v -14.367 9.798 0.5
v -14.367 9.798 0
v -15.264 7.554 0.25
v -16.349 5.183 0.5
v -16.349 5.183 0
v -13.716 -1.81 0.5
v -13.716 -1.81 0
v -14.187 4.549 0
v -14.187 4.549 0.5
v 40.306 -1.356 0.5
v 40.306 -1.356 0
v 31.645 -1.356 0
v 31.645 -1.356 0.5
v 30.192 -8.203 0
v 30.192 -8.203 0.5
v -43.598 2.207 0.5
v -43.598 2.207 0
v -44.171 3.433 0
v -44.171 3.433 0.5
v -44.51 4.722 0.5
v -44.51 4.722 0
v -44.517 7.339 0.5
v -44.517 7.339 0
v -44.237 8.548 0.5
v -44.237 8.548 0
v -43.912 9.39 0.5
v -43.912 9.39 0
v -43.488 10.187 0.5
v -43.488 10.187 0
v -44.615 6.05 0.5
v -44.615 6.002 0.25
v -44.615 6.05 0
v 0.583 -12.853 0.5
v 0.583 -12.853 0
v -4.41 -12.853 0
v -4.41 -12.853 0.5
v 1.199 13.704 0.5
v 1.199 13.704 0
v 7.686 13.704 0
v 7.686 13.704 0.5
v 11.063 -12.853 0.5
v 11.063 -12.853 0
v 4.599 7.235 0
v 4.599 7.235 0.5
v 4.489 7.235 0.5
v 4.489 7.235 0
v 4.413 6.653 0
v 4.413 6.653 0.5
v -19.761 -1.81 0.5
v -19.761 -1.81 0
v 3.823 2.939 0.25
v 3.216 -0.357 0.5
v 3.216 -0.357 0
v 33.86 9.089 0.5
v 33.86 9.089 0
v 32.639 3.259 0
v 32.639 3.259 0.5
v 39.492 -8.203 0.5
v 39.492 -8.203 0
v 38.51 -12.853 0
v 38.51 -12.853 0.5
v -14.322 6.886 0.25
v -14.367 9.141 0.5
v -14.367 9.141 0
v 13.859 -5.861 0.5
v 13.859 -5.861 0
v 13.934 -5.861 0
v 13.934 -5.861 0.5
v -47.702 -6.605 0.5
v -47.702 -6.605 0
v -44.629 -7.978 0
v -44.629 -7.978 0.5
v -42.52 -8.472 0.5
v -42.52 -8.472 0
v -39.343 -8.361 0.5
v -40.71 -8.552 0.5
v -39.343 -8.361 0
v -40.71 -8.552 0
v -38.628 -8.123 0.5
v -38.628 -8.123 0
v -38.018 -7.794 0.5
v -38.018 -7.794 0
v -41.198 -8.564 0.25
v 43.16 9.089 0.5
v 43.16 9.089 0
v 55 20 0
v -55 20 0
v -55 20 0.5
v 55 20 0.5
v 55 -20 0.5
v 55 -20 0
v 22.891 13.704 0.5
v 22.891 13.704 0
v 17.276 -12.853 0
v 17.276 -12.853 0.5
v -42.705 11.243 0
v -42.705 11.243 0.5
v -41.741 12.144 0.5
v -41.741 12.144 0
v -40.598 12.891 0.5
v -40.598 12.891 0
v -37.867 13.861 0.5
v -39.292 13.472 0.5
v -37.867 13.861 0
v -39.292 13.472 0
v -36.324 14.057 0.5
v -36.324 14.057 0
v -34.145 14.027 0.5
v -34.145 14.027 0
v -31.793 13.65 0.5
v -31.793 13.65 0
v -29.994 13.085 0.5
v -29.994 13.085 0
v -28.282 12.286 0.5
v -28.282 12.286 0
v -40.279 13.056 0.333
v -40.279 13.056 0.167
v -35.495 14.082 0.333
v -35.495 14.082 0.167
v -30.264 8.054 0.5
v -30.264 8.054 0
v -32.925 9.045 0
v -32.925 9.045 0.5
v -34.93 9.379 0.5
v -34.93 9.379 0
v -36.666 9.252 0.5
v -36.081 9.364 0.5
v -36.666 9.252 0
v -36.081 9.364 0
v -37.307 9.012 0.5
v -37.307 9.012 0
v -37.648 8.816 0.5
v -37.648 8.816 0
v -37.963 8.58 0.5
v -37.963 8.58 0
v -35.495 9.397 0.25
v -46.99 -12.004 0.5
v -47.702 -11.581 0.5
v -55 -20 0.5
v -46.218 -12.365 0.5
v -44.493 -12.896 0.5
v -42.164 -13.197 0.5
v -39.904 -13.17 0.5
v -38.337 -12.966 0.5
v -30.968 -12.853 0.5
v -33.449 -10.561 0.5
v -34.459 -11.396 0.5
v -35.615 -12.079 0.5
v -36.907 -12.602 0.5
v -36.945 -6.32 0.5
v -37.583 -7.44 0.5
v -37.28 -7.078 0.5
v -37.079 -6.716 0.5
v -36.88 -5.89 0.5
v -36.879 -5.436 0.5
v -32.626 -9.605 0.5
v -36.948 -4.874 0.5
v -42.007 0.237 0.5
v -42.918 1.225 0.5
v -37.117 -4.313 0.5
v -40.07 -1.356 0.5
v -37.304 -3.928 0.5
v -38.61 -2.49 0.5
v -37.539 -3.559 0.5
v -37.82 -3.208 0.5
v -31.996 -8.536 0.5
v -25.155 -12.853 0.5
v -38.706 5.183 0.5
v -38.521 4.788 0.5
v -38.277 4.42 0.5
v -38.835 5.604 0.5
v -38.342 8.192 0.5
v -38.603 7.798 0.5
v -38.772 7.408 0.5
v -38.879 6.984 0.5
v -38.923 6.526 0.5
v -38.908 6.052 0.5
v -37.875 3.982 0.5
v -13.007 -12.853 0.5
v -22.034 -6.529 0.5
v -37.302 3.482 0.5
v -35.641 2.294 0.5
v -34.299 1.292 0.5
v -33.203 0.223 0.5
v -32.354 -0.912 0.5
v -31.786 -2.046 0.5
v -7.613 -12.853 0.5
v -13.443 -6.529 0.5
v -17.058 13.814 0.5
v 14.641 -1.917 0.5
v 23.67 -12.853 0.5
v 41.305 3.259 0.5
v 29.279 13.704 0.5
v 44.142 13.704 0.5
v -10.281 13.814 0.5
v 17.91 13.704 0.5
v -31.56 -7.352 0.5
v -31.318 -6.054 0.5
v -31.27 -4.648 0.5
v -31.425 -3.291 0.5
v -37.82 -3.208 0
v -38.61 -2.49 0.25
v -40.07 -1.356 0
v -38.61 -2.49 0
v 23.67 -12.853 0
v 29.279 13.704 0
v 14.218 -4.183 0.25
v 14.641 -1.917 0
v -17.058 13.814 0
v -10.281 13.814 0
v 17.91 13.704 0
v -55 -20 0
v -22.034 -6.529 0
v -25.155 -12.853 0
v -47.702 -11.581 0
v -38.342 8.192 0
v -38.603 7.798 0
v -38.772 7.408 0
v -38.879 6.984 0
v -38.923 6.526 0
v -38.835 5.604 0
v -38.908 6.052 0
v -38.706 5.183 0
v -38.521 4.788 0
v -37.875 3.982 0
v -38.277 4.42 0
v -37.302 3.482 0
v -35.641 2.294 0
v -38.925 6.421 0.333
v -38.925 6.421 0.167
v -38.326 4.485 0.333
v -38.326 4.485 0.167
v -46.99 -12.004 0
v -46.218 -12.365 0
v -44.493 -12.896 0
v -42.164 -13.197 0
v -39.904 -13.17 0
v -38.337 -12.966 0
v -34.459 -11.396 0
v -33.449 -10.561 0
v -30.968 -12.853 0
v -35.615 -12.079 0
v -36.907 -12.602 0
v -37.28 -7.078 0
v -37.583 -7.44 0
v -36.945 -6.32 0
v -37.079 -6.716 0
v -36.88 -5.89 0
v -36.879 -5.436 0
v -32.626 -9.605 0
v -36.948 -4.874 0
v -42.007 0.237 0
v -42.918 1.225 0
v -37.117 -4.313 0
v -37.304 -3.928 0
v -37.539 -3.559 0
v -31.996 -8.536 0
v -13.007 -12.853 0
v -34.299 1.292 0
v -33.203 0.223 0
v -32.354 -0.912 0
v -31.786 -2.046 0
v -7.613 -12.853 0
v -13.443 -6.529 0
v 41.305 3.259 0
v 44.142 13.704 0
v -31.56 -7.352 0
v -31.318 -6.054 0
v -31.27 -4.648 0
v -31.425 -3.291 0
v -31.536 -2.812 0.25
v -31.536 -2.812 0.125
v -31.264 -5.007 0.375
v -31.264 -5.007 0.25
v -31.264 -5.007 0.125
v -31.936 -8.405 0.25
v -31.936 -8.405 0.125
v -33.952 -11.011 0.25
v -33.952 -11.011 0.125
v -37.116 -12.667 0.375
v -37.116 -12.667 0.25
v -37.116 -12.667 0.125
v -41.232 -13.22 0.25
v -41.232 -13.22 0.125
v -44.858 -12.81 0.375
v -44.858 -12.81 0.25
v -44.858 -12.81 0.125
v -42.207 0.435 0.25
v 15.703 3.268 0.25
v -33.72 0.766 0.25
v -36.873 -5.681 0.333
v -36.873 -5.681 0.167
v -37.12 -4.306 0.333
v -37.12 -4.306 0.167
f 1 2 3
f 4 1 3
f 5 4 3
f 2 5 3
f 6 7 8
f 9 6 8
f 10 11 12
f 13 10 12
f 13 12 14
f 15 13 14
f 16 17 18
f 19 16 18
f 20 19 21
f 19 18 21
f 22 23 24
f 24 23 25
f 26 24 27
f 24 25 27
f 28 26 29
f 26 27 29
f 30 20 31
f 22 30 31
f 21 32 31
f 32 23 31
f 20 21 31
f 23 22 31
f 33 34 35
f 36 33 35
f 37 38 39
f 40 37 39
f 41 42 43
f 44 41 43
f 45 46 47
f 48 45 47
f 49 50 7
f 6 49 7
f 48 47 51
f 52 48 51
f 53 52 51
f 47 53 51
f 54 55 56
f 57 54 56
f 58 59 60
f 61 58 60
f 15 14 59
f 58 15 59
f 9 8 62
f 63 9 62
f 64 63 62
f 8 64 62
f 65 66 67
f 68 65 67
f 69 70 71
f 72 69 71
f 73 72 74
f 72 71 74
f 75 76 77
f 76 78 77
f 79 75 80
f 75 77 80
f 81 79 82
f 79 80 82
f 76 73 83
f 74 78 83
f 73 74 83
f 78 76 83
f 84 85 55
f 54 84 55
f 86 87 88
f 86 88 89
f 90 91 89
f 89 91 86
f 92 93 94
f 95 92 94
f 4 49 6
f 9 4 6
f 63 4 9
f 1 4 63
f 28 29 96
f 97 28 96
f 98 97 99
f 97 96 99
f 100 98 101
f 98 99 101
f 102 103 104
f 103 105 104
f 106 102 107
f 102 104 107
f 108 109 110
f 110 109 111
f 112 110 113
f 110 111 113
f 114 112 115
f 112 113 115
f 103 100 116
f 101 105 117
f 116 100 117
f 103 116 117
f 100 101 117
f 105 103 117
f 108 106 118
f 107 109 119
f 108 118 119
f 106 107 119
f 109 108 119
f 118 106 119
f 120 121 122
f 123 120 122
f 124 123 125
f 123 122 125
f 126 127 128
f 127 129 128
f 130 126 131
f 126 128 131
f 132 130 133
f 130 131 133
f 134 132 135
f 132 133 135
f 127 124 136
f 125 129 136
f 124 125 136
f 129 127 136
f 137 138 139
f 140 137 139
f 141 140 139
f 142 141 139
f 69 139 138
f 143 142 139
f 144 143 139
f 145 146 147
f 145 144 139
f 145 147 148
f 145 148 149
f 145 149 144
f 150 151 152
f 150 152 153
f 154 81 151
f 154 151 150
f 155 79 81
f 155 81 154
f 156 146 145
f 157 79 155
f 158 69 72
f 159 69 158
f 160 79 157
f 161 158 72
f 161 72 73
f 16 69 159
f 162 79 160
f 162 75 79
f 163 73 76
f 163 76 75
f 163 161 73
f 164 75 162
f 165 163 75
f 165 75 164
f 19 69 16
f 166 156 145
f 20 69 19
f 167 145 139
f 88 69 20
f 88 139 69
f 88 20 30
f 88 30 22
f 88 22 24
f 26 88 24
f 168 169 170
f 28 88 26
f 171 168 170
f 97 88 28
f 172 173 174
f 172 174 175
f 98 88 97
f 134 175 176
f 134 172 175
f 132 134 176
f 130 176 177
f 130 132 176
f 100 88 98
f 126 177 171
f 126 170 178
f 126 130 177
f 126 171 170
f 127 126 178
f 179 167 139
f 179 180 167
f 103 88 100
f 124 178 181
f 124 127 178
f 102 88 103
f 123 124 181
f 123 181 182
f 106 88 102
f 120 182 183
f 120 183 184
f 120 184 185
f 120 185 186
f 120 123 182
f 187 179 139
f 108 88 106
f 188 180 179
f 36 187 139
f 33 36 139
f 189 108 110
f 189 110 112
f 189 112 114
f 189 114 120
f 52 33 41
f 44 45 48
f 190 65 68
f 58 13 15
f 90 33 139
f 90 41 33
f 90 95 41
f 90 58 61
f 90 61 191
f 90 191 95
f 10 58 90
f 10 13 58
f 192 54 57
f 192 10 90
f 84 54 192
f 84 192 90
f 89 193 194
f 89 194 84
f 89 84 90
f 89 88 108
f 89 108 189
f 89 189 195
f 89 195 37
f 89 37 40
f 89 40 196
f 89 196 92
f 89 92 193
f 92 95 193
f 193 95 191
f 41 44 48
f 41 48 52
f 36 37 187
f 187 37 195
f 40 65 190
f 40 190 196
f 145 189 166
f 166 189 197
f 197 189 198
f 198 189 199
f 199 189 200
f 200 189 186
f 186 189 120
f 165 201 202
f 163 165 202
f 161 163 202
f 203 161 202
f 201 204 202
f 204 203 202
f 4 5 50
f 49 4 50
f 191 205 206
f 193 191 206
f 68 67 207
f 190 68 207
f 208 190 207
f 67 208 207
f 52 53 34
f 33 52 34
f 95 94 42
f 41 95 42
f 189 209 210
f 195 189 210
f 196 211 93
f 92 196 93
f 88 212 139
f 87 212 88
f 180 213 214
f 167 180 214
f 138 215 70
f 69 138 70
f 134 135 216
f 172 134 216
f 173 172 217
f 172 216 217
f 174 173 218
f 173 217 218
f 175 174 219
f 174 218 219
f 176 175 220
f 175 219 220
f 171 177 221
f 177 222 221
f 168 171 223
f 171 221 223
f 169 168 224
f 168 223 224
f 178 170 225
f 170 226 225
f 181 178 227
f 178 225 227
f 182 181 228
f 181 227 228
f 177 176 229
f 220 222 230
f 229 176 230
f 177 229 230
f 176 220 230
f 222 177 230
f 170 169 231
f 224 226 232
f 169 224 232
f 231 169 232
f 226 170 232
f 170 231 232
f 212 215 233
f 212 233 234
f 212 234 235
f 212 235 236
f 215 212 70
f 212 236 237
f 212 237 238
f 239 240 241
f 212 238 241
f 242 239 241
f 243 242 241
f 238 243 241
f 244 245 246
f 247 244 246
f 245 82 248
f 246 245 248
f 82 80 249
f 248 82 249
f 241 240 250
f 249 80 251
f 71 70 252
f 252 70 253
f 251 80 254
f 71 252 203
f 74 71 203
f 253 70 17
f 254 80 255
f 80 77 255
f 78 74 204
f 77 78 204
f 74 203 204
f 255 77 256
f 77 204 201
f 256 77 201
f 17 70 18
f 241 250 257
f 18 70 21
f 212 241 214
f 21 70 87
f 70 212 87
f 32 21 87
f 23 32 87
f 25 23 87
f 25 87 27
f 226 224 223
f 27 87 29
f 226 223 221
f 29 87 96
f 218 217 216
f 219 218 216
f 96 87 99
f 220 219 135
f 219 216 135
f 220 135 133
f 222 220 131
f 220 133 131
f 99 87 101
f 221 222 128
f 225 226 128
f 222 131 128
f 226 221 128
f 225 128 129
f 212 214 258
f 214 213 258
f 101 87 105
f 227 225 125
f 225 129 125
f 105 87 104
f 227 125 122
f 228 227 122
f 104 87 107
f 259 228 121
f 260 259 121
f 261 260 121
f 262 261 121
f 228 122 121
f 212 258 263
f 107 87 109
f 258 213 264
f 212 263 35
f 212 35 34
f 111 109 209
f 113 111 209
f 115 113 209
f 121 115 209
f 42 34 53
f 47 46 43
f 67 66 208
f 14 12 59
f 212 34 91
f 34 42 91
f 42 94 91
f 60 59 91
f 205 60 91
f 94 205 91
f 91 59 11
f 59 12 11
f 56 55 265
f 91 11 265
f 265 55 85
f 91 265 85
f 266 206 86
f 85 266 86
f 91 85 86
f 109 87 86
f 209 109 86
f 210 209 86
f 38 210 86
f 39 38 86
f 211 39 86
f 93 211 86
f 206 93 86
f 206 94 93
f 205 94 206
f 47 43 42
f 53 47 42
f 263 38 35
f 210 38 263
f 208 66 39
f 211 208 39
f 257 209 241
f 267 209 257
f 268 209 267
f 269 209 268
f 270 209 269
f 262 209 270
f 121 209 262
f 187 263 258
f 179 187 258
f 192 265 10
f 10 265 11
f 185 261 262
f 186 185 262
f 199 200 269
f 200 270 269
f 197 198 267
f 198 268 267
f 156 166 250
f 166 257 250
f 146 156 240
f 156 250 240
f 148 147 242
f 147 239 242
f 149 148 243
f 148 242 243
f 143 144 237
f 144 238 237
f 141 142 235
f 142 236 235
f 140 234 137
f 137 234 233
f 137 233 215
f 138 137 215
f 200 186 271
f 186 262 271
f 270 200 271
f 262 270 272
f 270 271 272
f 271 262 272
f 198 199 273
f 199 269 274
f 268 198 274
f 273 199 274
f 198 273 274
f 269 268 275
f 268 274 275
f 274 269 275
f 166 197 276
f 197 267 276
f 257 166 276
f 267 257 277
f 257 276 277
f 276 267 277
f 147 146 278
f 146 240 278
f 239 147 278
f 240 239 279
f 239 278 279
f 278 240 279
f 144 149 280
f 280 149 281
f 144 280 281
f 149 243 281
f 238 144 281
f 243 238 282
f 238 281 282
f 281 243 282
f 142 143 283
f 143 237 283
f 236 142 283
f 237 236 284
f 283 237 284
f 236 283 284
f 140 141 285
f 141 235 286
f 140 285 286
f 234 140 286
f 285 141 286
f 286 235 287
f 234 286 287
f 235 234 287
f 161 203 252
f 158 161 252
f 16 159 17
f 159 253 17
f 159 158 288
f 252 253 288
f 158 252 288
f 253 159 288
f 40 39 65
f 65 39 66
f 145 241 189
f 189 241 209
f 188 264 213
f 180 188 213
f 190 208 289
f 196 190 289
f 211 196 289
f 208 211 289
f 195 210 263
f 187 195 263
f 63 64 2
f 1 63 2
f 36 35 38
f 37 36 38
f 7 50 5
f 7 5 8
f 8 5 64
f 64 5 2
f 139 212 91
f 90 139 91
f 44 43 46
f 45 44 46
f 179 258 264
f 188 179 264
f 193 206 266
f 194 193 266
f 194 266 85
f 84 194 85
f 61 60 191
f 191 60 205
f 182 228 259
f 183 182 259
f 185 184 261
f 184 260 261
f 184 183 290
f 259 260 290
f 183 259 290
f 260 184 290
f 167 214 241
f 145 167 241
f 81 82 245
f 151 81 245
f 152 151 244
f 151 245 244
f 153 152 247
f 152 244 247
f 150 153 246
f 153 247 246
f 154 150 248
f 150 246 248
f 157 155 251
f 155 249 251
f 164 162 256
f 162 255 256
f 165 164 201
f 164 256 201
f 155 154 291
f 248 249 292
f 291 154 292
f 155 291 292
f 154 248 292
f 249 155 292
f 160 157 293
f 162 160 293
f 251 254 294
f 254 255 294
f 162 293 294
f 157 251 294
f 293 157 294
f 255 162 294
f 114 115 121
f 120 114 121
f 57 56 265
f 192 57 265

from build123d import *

# Parameters (mm, degrees)
F0_W     = 110
F0_H     = 40
F1_DEPTH = 0.5


# Not quite as in the source:
# - a feature names something its author has since deleted; it is built from what else it names


with BuildPart() as f1:
    # F0 (on Top) → F1 (new body)
    with BuildSketch(Plane.XY):
        Rectangle(F0_W, F0_H)
        with BuildLine():
            add(Edge.make_bspline(
                [(-32.3537972674, -0.9116386363), (-31.2639477814, -2.6641166099), (-31.2639477814, -5.0065664386)],
                knots=[0, 0, 0, 1, 1, 1], degree=2))
            add(Edge.make_bspline(
                [(-31.2639477814, -5.0065664386), (-31.2639477814, -8.8021489153), (-33.9522431803, -11.0109105404)],
                knots=[0, 0, 0, 1, 1, 1], degree=2))
            add(Edge.make_bspline(
                [(-33.9522431803, -11.0109105404), (-36.6405385792, -13.2196721655), (-41.2324377471, -13.2196721655)],
                knots=[0, 0, 0, 1, 1, 1], degree=2))
            add(Edge.make_bspline(
                [(-41.2324377471, -13.2196721655), (-45.2488963864, -13.2196721655), (-47.7017842963, -11.5805385384)],
                knots=[0, 0, 0, 1, 1, 1], degree=2))
            Line((-47.7017842963, -11.5805385384), (-47.7017842963, -6.6050123515))
            add(Edge.make_bspline(
                [(-47.7017842963, -6.6050123515), (-44.1968283492, -8.563835161), (-41.1975625636, -8.563835161)],
                knots=[0, 0, 0, 1, 1, 1], degree=2))
            add(Edge.make_bspline(
                [(-41.1975625636, -8.563835161), (-39.1631768563, -8.563835161), (-38.0181083296, -7.7936748576)],
                knots=[0, 0, 0, 1, 1, 1], degree=2))
            add(Edge.make_bspline(
                [(-38.0181083296, -7.7936748576), (-36.8730398029, -7.0235145541), (-36.8730398029, -5.6808199873)],
                knots=[0, 0, 0, 1, 1, 1], degree=2))
            add(Edge.make_bspline(
                [(-36.8730398029, -5.6808199873), (-36.8730398029, -4.8961283573), (-37.1200723531, -4.3061565022)],
                knots=[0, 0, 0, 1, 1, 1], degree=2))
            add(Edge.make_bspline(
                [(-37.1200723531, -4.3061565022), (-37.3671049033, -3.7161846471), (-37.8204822895, -3.2075882203)],
                knots=[0, 0, 0, 1, 1, 1], degree=2))
            add(Edge.make_bspline(
                [(-37.8204822895, -3.2075882203), (-38.2738596757, -2.6989917934), (-40.0699316287, -1.3562972266)],
                knots=[0, 0, 0, 1, 1, 1], degree=2))
            add(Edge.make_bspline(
                [(-40.0699316287, -1.3562972266), (-42.5809448445, 0.445587257), (-43.5981376982, 2.2067840264)],
                knots=[0, 0, 0, 1, 1, 1], degree=2))
            add(Edge.make_bspline(
                [(-43.5981376982, 2.2067840264), (-44.6153305518, 3.9679807959), (-44.6153305518, 6.0023665032)],
                knots=[0, 0, 0, 1, 1, 1], degree=2))
            add(Edge.make_bspline(
                [(-44.6153305518, 6.0023665032), (-44.6153305518, 8.3448163319), (-43.4876996169, 10.1873885296)],
                knots=[0, 0, 0, 1, 1, 1], degree=2))
            add(Edge.make_bspline(
                [(-43.4876996169, 10.1873885296), (-42.360068682, 12.0299607274), (-40.27918273, 13.0558723769)],
                knots=[0, 0, 0, 1, 1, 1], degree=2))
            add(Edge.make_bspline(
                [(-40.27918273, 13.0558723769), (-38.198296778, 14.0817840264), (-35.4954700526, 14.0817840264)],
                knots=[0, 0, 0, 1, 1, 1], degree=2))
            add(Edge.make_bspline(
                [(-35.4954700526, 14.0817840264), (-31.554574311, 14.0817840264), (-28.2821195875, 12.2857120734)],
                knots=[0, 0, 0, 1, 1, 1], degree=2))
            Line((-28.2821195875, 12.2857120734), (-30.2641925195, 8.0541898022))
            add(Edge.make_bspline(
                [(-30.2641925195, 8.0541898022), (-33.0948949179, 9.3968843691), (-35.4954700526, 9.3968843691)],
                knots=[0, 0, 0, 1, 1, 1], degree=2))
            add(Edge.make_bspline(
                [(-35.4954700526, 9.3968843691), (-37.0009154759, 9.3968843691), (-37.962889289, 8.5802238208)],
                knots=[0, 0, 0, 1, 1, 1], degree=2))
            add(Edge.make_bspline(
                [(-37.962889289, 8.5802238208), (-38.924863102, 7.7635632726), (-38.924863102, 6.4208687058)],
                knots=[0, 0, 0, 1, 1, 1], degree=2))
            add(Edge.make_bspline(
                [(-38.924863102, 6.4208687058), (-38.924863102, 5.3106753627), (-38.326172451, 4.4852960186)],
                knots=[0, 0, 0, 1, 1, 1], degree=2))
            add(Edge.make_bspline(
                [(-38.326172451, 4.4852960186), (-37.7274818, 3.6599166745), (-35.6407833174, 2.2939719853)],
                knots=[0, 0, 0, 1, 1, 1], degree=2))
            add(Edge.make_bspline(
                [(-35.6407833174, 2.2939719853), (-33.4436467535, 0.8408393372), (-32.3537972674, -0.9116386363)],
                knots=[0, 0, 0, 1, 1, 1], degree=2))
        make_face(mode=Mode.SUBTRACT)
        Polygon((-13.0067891911, -12.8534827381), (-13.4427289855, -6.5294494538), (-22.0336492009, -6.5294494538), (-25.1549781289, -12.8534827381), (-30.9675087212, -12.8534827381), (-17.0581230139, 13.8144076192), (-10.2807123433, 13.8144076192), (-7.6127608014, -12.8534827381), align=None, mode=Mode.SUBTRACT)
        with BuildLine():
            Line((22.8913997468, 13.7039695379), (17.2764951946, -12.8534827381))
            Line((17.2764951946, -12.8534827381), (11.0628999915, -12.8534827381))
            Line((11.0628999915, -12.8534827381), (4.5993659729, 7.2346229887))
            Line((4.5993659729, 7.2346229887), (4.4889278916, 7.2346229887))
            Line((4.4889278916, 7.2346229887), (4.4133649939, 6.6533699295))
            add(Edge.make_bspline(
                [(4.4133649939, 6.6533699295), (3.8321119347, 2.7299117797), (3.2159836919, -0.3565419648)],
                knots=[0, 0, 0, 1, 1, 1], degree=2))
            Line((3.2159836919, -0.3565419648), (0.5829073336, -12.8534827381))
            Line((0.5829073336, -12.8534827381), (-4.4100564451, -12.8534827381))
            Line((-4.4100564451, -12.8534827381), (1.1990355764, 13.7039695379))
            Line((1.1990355764, 13.7039695379), (7.6858197174, 13.7039695379))
            Line((7.6858197174, 13.7039695379), (13.8587272064, -5.8610084356))
            Line((13.8587272064, -5.8610084356), (13.9342901041, -5.8610084356))
            add(Edge.make_bspline(
                [(13.9342901041, -5.8610084356), (14.149353736, -4.4776261547), (14.640512571, -1.9172064288)],
                knots=[0, 0, 0, 1, 1, 1], degree=2))
            add(Edge.make_bspline(
                [(14.640512571, -1.9172064288), (15.1316714061, 0.6432132971), (17.9100610292, 13.7039695379)],
                knots=[0, 0, 0, 1, 1, 1], degree=2))
            Line((17.9100610292, 13.7039695379), (22.8913997468, 13.7039695379))
        make_face(mode=Mode.SUBTRACT)
        Polygon((39.4919871183, -8.2034582643), (38.5096694482, -12.8534827381), (23.6702788461, -12.8534827381), (29.2793708677, 13.7039695379), (44.1420115921, 13.7039695379), (43.159693922, 9.0888202477), (33.8596449744, 9.0888202477), (32.63901355, 3.2588520636), (41.3054966631, 3.2588520636), (40.3057414012, -1.3562972266), (31.6450708187, -1.3562972266), (30.1919381706, -8.2034582643), align=None, mode=Mode.SUBTRACT)
    extrude(amount=F1_DEPTH)


with BuildPart() as f1b:
    # F0 (on Top) → F1, piece 2 (new body)
    with BuildSketch(Plane.XY):
        with BuildLine():
            Line((-19.7609497393, -1.8096746128), (-13.7159179233, -1.8096746128))
            Line((-13.7159179233, -1.8096746128), (-14.1867329013, 4.5492338551))
            add(Edge.make_bspline(
                [(-14.1867329013, 4.5492338551), (-14.3669213497, 6.9265588673), (-14.3669213497, 9.141133023)],
                knots=[0, 0, 0, 1, 1, 1], degree=2))
            Line((-14.3669213497, 9.141133023), (-14.3669213497, 9.7979489799))
            add(Edge.make_bspline(
                [(-14.3669213497, 9.7979489799), (-15.1690505714, 7.6182500078), (-16.3489942816, 5.1827996897)],
                knots=[0, 0, 0, 1, 1, 1], degree=2))
            Line((-16.3489942816, 5.1827996897), (-19.7609497393, -1.8096746128))
        make_face()
    extrude(amount=F1_DEPTH)


solid = Compound([f1.part, f1b.part])
